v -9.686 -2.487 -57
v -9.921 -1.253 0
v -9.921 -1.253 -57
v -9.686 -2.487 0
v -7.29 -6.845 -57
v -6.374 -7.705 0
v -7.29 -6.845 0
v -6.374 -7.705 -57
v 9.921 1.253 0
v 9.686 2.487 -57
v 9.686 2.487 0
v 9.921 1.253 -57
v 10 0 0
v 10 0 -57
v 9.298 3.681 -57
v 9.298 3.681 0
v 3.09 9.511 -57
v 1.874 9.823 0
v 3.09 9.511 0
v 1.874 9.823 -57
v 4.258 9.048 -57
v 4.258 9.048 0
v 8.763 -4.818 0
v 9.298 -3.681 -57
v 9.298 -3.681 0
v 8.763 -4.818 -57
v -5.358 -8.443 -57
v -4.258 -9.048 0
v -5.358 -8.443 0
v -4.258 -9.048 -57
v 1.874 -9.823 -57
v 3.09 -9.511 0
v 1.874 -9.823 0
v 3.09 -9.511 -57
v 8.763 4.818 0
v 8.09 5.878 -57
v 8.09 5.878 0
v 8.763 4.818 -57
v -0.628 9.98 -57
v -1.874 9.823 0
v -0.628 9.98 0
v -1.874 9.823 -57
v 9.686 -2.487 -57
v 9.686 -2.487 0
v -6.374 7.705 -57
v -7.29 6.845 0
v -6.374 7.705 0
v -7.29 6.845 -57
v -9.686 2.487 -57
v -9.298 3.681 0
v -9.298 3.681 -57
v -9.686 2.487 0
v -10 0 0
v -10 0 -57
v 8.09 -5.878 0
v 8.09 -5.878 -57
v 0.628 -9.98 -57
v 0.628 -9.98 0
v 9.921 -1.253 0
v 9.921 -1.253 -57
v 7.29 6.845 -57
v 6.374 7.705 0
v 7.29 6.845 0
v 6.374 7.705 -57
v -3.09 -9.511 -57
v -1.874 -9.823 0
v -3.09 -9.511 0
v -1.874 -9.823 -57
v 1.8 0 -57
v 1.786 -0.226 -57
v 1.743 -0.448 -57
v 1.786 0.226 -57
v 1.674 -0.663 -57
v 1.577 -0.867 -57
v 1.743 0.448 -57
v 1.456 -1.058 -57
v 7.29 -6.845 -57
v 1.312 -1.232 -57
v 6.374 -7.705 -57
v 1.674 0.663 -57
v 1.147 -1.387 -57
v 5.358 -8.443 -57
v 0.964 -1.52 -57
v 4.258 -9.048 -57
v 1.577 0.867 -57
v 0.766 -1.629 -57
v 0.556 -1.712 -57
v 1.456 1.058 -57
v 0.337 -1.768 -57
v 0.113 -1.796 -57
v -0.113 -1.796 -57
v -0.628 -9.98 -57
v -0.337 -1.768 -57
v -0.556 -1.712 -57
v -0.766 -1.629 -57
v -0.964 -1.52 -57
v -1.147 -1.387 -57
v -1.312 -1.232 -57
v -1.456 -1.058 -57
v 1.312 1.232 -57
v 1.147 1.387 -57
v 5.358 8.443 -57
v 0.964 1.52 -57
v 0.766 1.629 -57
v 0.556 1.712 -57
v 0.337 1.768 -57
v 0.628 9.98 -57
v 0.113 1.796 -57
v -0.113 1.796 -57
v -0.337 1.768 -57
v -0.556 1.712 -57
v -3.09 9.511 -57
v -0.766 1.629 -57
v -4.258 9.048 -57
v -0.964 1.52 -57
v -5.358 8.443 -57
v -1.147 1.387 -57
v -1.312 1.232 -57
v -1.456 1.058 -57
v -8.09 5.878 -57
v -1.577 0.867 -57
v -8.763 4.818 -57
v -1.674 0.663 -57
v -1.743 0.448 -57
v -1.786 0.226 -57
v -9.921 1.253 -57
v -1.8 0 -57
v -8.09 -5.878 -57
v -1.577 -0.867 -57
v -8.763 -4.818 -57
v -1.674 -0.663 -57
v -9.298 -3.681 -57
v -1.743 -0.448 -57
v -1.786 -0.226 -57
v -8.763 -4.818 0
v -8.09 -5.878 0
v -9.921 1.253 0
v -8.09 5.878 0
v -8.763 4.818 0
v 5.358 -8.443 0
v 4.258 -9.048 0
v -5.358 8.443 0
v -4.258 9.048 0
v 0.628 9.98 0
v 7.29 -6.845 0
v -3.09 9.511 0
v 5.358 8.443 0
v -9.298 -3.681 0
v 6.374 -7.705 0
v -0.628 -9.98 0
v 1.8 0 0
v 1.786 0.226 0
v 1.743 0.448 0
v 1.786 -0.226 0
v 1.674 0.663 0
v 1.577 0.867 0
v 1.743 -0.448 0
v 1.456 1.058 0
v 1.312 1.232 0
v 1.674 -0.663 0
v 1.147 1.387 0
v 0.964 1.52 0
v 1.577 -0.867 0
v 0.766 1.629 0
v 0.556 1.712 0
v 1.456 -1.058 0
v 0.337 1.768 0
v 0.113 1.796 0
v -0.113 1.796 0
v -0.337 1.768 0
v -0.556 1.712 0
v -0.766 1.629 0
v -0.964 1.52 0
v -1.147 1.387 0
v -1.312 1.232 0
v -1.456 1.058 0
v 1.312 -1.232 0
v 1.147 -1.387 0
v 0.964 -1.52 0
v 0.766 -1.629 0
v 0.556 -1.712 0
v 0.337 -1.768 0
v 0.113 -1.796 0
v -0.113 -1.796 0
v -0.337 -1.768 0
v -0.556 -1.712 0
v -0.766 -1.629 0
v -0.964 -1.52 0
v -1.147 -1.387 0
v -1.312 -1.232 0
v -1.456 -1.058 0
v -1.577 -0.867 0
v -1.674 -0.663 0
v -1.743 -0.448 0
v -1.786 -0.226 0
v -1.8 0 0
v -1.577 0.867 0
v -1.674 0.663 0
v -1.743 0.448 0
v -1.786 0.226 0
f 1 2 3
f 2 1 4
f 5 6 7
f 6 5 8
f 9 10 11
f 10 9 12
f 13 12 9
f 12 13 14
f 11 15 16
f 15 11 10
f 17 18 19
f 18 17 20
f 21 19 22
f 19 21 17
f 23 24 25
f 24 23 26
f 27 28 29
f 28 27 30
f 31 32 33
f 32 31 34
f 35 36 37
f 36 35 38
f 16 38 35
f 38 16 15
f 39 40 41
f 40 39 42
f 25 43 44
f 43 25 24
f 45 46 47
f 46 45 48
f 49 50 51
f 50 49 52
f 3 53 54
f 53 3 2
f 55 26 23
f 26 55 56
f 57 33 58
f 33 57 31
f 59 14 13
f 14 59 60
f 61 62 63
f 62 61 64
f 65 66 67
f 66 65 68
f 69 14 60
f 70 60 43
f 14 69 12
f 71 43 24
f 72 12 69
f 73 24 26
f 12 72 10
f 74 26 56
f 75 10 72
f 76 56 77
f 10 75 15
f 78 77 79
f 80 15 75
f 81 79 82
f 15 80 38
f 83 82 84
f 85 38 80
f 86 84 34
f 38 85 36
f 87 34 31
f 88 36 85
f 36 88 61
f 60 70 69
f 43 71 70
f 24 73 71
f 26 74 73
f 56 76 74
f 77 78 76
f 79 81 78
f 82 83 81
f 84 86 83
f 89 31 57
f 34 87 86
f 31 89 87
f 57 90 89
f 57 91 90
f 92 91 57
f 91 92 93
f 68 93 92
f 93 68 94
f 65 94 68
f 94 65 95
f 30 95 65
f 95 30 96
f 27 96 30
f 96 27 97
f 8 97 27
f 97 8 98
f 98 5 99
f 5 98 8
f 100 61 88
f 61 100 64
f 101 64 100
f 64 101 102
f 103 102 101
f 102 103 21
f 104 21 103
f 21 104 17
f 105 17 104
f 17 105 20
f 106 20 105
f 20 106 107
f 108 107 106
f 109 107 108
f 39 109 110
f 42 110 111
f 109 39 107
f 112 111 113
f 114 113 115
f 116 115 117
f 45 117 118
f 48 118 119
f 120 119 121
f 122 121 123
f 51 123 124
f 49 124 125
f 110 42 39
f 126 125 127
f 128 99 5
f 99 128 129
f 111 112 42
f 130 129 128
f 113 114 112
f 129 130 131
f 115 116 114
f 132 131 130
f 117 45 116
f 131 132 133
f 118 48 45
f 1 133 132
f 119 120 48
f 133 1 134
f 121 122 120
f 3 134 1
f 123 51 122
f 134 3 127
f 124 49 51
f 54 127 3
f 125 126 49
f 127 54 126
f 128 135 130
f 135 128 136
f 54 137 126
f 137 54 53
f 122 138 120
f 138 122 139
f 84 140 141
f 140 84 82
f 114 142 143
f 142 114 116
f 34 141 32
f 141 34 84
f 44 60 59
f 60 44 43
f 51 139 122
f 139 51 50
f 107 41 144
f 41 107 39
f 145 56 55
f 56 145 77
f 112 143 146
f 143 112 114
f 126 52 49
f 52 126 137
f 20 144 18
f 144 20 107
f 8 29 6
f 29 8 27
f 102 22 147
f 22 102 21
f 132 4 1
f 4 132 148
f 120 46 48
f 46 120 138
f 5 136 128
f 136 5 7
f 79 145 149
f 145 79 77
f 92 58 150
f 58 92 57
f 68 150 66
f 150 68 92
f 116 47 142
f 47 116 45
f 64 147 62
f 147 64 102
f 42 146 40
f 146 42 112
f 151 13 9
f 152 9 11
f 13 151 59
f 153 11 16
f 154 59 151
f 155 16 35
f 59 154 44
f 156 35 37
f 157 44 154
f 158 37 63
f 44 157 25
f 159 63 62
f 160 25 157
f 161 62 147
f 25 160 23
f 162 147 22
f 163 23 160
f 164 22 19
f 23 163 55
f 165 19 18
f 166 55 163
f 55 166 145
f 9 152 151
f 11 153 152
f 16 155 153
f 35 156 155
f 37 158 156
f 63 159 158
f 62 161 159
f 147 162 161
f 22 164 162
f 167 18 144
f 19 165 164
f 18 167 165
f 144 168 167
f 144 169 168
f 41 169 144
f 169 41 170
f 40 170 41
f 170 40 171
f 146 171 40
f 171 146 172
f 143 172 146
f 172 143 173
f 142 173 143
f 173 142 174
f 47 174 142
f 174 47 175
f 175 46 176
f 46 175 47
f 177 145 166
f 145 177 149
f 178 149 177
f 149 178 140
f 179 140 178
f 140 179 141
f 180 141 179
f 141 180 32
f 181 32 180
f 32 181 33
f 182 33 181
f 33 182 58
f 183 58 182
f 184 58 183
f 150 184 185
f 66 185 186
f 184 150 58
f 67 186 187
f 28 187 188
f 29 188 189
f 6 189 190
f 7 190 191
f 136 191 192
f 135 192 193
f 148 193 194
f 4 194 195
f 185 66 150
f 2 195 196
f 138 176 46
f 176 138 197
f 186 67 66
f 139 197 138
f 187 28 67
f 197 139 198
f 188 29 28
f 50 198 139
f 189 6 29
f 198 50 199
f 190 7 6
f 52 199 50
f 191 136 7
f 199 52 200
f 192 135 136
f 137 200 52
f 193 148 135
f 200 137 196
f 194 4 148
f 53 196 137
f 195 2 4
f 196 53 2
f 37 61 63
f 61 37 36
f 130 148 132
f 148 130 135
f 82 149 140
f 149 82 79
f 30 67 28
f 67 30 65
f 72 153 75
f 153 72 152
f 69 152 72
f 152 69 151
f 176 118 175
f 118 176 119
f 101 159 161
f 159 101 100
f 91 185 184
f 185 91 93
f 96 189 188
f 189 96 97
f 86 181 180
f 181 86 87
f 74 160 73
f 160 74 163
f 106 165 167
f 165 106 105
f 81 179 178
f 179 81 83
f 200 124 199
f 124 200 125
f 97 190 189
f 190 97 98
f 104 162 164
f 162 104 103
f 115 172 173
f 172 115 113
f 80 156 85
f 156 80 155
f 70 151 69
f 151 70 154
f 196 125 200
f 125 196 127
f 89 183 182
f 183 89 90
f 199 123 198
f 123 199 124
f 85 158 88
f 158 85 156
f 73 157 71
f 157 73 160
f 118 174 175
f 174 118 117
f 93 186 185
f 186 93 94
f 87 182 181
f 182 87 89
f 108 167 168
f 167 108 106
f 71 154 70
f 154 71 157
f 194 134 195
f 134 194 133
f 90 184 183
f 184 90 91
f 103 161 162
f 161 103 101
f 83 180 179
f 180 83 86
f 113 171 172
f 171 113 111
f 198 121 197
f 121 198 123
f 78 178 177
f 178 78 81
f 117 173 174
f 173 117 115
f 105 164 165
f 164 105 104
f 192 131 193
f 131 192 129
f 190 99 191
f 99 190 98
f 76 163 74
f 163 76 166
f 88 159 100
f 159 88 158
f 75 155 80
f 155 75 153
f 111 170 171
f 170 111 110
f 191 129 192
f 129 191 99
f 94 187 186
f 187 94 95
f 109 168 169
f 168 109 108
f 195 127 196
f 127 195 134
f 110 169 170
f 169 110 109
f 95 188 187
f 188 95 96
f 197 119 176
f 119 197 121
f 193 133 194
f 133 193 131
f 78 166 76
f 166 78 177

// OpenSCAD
$fn = 50;


difference() {
	union() {
		translate(v = [0, 0, -57.0000000000]) {
			cylinder(h = 57, r = 10.0000000000);
		}
		cylinder(h = 0, r = 16.0000000000);
	}
	union() {
		#translate(v = [0, 0, -57]) {
			cylinder(h = 57, r = 1.8000000000);
		}
	}
}
